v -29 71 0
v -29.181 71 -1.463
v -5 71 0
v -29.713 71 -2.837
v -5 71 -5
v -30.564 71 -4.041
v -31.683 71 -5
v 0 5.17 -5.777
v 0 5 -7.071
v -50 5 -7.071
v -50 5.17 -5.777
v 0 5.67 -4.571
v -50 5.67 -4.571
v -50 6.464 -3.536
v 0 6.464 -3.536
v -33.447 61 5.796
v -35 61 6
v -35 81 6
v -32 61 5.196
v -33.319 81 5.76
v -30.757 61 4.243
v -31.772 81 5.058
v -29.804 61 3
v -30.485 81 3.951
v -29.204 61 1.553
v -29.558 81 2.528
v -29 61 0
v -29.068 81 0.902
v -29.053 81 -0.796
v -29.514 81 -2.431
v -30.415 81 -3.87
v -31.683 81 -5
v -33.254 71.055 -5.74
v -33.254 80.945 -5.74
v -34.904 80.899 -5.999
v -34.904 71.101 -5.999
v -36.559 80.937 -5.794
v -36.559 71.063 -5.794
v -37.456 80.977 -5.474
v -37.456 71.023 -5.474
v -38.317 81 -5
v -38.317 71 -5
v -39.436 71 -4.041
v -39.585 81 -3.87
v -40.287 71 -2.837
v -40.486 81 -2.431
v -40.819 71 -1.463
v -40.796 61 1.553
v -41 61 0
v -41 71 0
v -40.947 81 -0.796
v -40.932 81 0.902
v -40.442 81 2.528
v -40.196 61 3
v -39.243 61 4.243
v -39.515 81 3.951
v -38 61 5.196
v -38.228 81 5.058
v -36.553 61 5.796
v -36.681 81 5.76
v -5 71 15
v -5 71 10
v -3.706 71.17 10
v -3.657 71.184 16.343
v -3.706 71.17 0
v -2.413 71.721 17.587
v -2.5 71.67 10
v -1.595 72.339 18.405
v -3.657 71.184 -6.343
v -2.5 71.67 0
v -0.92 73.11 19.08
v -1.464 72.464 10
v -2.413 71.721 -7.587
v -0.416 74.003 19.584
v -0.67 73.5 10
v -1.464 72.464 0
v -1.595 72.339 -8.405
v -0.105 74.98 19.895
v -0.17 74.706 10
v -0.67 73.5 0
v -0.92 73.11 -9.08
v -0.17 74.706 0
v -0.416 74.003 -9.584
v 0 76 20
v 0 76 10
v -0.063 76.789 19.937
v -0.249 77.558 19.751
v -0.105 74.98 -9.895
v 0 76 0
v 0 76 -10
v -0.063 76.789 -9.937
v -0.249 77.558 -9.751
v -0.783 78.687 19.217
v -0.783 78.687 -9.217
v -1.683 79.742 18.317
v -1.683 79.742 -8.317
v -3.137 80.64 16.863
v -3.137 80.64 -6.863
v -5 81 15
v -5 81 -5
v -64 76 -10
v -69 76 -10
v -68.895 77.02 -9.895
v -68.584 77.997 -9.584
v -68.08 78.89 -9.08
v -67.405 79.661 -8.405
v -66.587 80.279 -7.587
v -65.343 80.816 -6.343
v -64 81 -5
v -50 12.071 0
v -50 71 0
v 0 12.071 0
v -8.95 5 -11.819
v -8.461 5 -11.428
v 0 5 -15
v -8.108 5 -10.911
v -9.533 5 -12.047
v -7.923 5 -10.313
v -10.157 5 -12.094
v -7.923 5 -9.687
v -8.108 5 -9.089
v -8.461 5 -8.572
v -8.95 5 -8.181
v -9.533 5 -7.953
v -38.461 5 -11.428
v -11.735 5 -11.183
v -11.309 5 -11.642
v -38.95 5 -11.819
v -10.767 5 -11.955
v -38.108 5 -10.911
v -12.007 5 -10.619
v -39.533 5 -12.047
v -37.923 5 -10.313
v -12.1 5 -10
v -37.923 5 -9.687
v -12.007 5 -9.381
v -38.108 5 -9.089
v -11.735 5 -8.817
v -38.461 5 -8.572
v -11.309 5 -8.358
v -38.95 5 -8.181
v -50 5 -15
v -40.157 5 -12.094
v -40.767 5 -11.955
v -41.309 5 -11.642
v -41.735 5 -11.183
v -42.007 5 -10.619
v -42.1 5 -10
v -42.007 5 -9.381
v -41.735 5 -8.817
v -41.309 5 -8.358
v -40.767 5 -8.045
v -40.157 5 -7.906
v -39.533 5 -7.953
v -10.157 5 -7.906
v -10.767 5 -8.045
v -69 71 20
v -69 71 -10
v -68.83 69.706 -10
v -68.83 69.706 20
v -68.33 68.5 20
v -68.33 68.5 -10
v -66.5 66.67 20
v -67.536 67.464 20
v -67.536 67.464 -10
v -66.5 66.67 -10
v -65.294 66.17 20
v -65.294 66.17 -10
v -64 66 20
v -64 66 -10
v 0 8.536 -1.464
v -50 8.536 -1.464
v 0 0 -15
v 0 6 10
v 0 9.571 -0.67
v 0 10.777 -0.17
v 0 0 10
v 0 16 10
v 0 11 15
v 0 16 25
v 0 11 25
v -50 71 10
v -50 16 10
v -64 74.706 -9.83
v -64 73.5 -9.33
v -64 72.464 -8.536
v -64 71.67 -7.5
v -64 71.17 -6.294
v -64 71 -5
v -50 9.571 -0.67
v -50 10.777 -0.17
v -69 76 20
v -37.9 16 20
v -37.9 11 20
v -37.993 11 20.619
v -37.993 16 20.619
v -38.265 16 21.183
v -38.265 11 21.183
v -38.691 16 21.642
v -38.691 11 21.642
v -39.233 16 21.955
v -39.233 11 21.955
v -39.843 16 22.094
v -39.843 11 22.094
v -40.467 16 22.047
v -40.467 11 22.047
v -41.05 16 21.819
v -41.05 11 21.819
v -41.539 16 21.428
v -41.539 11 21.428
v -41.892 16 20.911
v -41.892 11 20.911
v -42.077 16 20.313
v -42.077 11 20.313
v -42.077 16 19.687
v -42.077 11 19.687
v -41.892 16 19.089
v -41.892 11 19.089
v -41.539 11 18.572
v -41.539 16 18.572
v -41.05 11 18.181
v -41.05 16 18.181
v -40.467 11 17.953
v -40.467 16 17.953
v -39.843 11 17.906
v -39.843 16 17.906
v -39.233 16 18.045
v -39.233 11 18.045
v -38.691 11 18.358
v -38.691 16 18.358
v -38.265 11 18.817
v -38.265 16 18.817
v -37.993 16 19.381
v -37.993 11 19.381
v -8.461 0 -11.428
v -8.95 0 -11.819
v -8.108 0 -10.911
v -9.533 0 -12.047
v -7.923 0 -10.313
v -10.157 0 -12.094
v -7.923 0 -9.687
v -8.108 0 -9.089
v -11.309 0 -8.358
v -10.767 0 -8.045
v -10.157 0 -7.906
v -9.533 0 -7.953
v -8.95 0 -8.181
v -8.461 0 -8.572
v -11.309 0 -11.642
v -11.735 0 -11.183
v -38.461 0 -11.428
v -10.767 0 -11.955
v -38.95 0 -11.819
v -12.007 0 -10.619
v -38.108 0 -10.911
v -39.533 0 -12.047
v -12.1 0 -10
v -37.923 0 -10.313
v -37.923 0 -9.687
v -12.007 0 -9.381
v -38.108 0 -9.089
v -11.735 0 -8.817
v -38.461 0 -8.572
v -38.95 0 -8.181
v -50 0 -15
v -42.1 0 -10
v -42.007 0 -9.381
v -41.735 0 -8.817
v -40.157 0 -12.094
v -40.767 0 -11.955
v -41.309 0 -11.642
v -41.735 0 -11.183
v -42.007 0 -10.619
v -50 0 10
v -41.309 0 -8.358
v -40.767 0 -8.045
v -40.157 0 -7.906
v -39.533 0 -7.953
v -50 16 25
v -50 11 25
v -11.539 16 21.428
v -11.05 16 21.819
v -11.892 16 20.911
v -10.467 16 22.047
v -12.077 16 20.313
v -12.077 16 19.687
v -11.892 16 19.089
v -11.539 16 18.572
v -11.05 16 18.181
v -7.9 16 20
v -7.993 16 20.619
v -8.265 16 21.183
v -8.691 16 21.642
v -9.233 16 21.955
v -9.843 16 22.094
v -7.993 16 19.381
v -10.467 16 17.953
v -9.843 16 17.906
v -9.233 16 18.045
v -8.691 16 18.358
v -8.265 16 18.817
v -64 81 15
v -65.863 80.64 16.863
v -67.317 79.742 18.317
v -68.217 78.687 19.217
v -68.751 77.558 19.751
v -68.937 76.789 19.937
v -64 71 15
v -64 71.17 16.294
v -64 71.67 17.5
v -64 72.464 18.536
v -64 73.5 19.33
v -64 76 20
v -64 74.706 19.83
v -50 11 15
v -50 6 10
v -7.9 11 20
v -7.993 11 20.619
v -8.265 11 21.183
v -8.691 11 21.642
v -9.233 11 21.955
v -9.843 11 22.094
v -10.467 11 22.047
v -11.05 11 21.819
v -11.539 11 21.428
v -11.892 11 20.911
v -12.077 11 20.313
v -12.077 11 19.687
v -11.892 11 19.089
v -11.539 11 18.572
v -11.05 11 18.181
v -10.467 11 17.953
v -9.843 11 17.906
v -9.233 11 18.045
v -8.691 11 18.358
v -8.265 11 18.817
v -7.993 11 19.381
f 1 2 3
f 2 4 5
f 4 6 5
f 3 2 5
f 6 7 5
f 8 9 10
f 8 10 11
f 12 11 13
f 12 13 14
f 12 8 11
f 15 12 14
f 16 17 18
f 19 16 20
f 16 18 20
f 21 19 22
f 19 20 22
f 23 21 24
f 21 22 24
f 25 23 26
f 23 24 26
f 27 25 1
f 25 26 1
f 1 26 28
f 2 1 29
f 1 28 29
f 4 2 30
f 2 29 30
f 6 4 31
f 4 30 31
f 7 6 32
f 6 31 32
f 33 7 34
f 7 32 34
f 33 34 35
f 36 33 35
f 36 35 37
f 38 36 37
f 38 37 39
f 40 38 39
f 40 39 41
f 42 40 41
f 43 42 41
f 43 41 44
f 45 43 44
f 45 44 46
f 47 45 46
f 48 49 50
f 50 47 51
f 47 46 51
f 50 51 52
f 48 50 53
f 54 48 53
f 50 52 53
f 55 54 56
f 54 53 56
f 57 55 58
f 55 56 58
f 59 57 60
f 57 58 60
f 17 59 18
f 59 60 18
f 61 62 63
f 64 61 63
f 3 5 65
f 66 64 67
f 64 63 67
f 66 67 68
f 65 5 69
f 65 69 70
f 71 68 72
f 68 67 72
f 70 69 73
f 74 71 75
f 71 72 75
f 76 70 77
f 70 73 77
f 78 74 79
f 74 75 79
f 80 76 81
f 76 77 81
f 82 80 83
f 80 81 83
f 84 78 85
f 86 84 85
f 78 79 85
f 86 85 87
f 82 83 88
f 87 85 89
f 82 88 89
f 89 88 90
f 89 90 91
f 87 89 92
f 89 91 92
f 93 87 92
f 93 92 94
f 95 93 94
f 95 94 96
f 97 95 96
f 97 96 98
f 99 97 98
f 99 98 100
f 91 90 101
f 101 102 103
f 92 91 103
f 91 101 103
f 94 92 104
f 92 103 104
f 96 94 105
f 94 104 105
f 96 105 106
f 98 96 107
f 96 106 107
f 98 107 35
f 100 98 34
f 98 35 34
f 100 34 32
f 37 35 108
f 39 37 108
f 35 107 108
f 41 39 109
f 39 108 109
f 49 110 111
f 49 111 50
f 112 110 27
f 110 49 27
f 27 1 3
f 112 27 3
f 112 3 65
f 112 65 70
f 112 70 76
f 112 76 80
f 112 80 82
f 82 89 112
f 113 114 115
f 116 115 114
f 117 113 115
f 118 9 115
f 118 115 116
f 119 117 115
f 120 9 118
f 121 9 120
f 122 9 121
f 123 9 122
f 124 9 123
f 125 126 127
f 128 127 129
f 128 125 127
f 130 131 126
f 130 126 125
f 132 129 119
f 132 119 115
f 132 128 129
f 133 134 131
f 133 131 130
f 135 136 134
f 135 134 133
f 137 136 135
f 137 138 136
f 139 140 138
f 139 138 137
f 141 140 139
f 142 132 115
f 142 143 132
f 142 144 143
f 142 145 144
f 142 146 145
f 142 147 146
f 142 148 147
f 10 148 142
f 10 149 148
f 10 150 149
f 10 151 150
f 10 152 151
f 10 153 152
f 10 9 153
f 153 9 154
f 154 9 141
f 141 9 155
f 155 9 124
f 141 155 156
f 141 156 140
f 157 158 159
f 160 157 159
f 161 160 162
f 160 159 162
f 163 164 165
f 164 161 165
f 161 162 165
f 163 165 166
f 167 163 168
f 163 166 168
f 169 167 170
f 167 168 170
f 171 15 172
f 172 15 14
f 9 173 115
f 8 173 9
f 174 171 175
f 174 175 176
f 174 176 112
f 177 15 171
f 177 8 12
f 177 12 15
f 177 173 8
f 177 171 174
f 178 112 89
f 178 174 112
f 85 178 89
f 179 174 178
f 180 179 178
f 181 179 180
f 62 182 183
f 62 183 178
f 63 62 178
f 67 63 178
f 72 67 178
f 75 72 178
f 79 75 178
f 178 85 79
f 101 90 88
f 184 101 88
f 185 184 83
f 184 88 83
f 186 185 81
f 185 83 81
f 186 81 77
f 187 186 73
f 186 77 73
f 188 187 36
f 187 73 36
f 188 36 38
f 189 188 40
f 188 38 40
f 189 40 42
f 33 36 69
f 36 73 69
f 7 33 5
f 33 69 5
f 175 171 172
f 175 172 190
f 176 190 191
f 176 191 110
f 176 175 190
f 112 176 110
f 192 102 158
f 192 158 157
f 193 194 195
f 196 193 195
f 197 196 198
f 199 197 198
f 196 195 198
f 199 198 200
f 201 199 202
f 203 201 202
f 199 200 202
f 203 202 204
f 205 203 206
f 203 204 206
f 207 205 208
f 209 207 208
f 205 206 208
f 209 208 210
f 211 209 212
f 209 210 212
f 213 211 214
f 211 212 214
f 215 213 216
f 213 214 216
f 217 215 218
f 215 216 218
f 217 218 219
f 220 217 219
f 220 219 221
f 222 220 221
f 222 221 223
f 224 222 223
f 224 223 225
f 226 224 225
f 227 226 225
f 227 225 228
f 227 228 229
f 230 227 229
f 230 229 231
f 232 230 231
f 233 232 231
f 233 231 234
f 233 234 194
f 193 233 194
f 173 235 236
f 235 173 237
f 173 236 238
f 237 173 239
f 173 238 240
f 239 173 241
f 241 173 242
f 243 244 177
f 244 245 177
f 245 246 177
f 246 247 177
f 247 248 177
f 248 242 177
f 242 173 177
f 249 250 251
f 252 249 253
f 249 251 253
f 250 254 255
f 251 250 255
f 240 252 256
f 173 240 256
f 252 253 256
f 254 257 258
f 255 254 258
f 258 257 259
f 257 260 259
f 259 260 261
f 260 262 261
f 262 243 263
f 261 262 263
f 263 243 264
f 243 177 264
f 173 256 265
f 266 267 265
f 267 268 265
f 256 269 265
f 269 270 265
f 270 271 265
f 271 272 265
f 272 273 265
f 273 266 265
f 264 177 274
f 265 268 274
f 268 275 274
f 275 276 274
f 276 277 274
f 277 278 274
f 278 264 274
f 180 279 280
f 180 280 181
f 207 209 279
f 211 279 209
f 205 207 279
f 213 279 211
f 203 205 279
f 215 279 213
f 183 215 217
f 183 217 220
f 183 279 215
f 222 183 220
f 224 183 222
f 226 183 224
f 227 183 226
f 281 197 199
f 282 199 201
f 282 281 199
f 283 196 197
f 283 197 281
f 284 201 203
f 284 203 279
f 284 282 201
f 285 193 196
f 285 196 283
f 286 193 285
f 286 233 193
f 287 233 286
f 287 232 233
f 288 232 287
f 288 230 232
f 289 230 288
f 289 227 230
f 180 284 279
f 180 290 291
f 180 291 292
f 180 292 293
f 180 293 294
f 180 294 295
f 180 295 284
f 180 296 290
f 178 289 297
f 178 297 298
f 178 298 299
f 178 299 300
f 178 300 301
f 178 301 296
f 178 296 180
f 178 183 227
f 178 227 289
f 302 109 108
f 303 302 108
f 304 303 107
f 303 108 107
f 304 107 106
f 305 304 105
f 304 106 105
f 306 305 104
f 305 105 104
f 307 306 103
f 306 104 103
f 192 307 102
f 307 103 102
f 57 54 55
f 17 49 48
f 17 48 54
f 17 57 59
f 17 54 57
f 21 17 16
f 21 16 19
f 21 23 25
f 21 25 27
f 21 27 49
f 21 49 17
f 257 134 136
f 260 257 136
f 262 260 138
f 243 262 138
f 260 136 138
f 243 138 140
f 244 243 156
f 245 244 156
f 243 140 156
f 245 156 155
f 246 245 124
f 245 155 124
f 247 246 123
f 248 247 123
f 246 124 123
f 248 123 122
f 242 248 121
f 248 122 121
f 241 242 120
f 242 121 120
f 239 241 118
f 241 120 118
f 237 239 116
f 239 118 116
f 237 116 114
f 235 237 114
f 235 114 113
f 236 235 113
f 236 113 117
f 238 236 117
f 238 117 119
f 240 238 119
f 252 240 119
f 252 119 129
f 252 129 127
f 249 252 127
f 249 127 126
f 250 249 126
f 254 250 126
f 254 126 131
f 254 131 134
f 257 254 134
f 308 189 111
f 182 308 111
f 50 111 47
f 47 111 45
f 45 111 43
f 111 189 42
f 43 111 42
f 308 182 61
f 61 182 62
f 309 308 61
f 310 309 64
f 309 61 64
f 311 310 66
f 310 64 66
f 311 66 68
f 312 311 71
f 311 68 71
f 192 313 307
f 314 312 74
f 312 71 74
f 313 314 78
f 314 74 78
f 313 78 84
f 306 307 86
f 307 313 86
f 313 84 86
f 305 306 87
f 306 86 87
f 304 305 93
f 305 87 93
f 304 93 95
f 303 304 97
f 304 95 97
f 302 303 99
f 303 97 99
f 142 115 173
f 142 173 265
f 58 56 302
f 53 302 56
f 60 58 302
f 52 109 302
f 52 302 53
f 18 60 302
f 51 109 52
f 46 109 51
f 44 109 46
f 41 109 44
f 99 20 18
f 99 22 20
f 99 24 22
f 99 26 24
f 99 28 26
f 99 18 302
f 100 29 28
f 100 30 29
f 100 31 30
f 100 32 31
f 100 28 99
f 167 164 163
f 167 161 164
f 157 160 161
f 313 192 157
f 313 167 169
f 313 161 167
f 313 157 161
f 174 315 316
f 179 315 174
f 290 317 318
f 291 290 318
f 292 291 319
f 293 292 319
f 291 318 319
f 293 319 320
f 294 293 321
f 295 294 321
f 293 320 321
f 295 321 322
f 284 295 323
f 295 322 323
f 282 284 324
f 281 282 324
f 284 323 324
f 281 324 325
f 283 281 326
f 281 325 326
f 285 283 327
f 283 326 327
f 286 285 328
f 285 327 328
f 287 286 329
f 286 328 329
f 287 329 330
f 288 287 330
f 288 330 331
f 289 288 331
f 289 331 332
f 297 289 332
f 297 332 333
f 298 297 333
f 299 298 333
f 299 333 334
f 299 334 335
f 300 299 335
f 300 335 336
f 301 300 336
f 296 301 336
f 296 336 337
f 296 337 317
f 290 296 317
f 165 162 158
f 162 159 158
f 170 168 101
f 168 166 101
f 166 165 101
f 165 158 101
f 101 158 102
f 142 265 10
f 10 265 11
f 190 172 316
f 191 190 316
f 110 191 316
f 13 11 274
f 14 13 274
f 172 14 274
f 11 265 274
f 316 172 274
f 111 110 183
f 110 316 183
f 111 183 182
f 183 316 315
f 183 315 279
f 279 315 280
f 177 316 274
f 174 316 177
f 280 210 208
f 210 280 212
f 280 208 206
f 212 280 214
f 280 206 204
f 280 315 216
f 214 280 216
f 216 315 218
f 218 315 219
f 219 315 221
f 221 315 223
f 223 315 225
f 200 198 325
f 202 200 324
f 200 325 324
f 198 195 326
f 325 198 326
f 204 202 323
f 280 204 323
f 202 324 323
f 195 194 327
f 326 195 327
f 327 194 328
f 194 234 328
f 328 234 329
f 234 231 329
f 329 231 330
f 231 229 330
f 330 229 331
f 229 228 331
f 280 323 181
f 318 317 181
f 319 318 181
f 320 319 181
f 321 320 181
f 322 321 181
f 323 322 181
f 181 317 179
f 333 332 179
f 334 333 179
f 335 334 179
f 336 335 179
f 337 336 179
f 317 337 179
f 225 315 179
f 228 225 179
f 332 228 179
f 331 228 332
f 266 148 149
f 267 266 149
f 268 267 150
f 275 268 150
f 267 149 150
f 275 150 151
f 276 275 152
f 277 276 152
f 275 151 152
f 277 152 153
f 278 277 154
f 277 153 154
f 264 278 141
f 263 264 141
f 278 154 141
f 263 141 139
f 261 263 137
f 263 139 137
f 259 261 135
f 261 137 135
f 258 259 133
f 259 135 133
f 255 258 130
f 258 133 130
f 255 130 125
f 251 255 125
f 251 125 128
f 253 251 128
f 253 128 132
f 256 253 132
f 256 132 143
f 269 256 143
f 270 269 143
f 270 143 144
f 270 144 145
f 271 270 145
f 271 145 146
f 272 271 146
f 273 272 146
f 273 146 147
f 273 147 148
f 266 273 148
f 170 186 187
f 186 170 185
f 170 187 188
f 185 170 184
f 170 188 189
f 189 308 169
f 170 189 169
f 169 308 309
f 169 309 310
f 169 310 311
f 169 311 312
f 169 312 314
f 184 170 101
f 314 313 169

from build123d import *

# Parameters (mm, degrees)
BOSS_EXTRU_1_DEPTH      = 10
BOSS_EXTRU_2_DEPTH      = 10
BOSS_EXTRU_2_DEPTH_BACK = 20
ESQUISSE2_W             = 69
ESQUISSE2_H             = 10
ESQUISSE3_W             = 50
ESQUISSE3_H             = 5
BOSS_EXTRU_3_DEPTH      = 15
CHANFREIN1_SIZE         = 5
ESQUISSE4_R             = 2.1
ENL_V_MAT_EXTRU_1_DEPTH = 15
ESQUISSE5_W             = 30
ESQUISSE5_H             = 5
BOSS_EXTRU_4_DEPTH      = 5
ESQUISSE6_W             = 50
ESQUISSE6_H             = 5
BOSS_EXTRU_5_DEPTH      = 15
CHANFREIN2_SIZE         = 5
ESQUISSE7_R             = 2.1
ENL_V_MAT_EXTRU_2_DEPTH = 15
ESQUISSE8_R             = 6
ENL_V_MAT_EXTRU_3_DEPTH = 20
CONG_1_R                = 5


with BuildPart() as part:
    # Esquisse1 → Boss.-Extru.1 (new body)
    with BuildSketch(Plane.XY):
        Polygon((0, 0), (0, 81), (-69, 81), (-69, 66), (-64, 66), (-64, 71), (-50, 71), (-50, 0), align=None)
    extrude(amount=BOSS_EXTRU_1_DEPTH)

    # Esquisse2 → Boss.-Extru.2 (add, two sides: drawn at the far end of the back side and taken through both)
    with BuildSketch(Plane.XY.offset(10).offset(-BOSS_EXTRU_2_DEPTH_BACK)):
        with Locations((-34.5, 76)):
            Rectangle(ESQUISSE2_W, ESQUISSE2_H)
    extrude(amount=BOSS_EXTRU_2_DEPTH + BOSS_EXTRU_2_DEPTH_BACK)

    # Esquisse3 → Boss.-Extru.3 (add)
    with BuildSketch(Plane(origin=(0, 0, 0), x_dir=(-1, 0, 0), z_dir=(0, 0, -1))):
        with Locations((25, 2.5)):
            Rectangle(ESQUISSE3_W, ESQUISSE3_H)
    extrude(amount=BOSS_EXTRU_3_DEPTH)

    # Chanfrein1
    chanfrein1_edges = [part.edges().sort_by_distance(p)[0] for p in [
        (-25, 5, 0),
    ]]
    chamfer(chanfrein1_edges, length=CHANFREIN1_SIZE)

    # Esquisse4 → Enlèv. mat.-Extru.1 (cut)
    with BuildSketch(Plane(origin=(0, 5, 0), x_dir=(1, 0, 0), z_dir=(0, 1, 0))):
        with Locations(Location((-40, 10, 0), (0, 0, 180))):
            Circle(ESQUISSE4_R)
        with Locations(Location((-10, 10, 0), (0, 0, 180))):
            Circle(ESQUISSE4_R)
    extrude(amount=-ENL_V_MAT_EXTRU_1_DEPTH, mode=Mode.SUBTRACT)

    # Esquisse5 → Boss.-Extru.4 (add)
    with BuildSketch(Plane.ZY.offset(69)):
        with Locations((5, 68.5)):
            Rectangle(ESQUISSE5_W, ESQUISSE5_H)
    extrude(amount=-BOSS_EXTRU_4_DEPTH)

    # Esquisse6 → Boss.-Extru.5 (add)
    with BuildSketch(Plane.XY.offset(10)):
        with Locations((-25, 13.5)):
            Rectangle(ESQUISSE6_W, ESQUISSE6_H)
    extrude(amount=BOSS_EXTRU_5_DEPTH)

    # Chanfrein2
    chanfrein2_edges = [part.edges().sort_by_distance(p)[0] for p in [
        (-25, 11, 10),
    ]]
    chamfer(chanfrein2_edges, length=CHANFREIN2_SIZE)

    # Esquisse7 → Enlèv. mat.-Extru.2 (cut)
    with BuildSketch(Plane.XZ.offset(-11)):
        with Locations((-10, 20)):
            Circle(ESQUISSE7_R)
        with Locations((-40, 20)):
            Circle(ESQUISSE7_R)
    extrude(amount=-ENL_V_MAT_EXTRU_2_DEPTH, mode=Mode.SUBTRACT)

    # Esquisse8 → Enlèv. mat.-Extru.3 (cut)
    with BuildSketch(Plane(origin=(0, 81, 0), x_dir=(1, 0, 0), z_dir=(0, 1, 0))):
        with Locations(Location((-35, 0, 0), (0, 0, 270))):
            Circle(ESQUISSE8_R)
    extrude(amount=-ENL_V_MAT_EXTRU_3_DEPTH, mode=Mode.SUBTRACT)

    # Congé1
    # the kernel refuses this fillet: 5 mm, written as the material it adds along each edge
    with BuildSketch(Plane(origin=(0, 10, 0), x_dir=(0, -0.7071067811865476, -0.7071067811865476), z_dir=(-1, 0, 0)), Plane(origin=(0, 5, -5), x_dir=(0, 0, -1), z_dir=(-1, 0, 0))) as cong_1_piece_1:
        with BuildLine():
            CenterArc((CONG_1_R * 0.414213562373, -CONG_1_R), CONG_1_R, 90, 45)
            Line((-CONG_1_R * 0.292893218813, -CONG_1_R * 0.292893218813), (0, 0))
            Line((0, 0), (CONG_1_R * 0.414213562373, 0))
        make_face()
    extrude(amount=50)
    # the kernel refuses this fillet: 5 mm, written as the material it takes off along each edge
    with BuildSketch(Plane(origin=(-81.5, 81, 20), x_dir=(0, -1, 0), z_dir=(1, 0, 0))) as cong_1_2_piece_1:
        with BuildLine():
            CenterArc((CONG_1_R, CONG_1_R), CONG_1_R, 180, 90)
            Line((0, CONG_1_R), (0, 0))
            Line((0, 0), (CONG_1_R, 0))
        make_face()
    extrude(amount=94, mode=Mode.SUBTRACT)
    with BuildSketch(Plane(origin=(12.5, 71, 20), x_dir=(0, 0, -1), z_dir=(-1, 0, 0))) as cong_1_2_piece_2:
        with BuildLine():
            CenterArc((CONG_1_R, -CONG_1_R), CONG_1_R, 90, 90)
            Line((0, -CONG_1_R), (0, 0))
            Line((0, 0), (CONG_1_R, 0))
        make_face()
    extrude(amount=76.5, mode=Mode.SUBTRACT)
    with BuildSketch(Plane(origin=(0, 71, -2.5), x_dir=(0, 1, 0), z_dir=(0, 0, 1))) as cong_1_2_piece_3_section:
        with BuildLine():
            CenterArc((CONG_1_R, CONG_1_R), CONG_1_R, 180, 90)
            Line((0, CONG_1_R), (0, 0))
            Line((0, 0), (CONG_1_R, 0))
        make_face()
    cong_1_2_piece_3 = extrude(amount=35, mode=Mode.PRIVATE)
    cong_1_2_piece_3 = split(cong_1_2_piece_3, bisect_by=Plane(origin=(-1.116839695, 72.116839695, 0), z_dir=(0, 0, -1)), keep=Keep.TOP, mode=Mode.PRIVATE)
    add(cong_1_2_piece_3, mode=Mode.SUBTRACT)
    with BuildSketch(Plane(origin=(0, 71, 10), x_dir=(0, 1, 0), z_dir=(0, 0, 1)), Plane(origin=(0, 71, -22.5), x_dir=(0, 1, 0), z_dir=(0, 0, 1))) as cong_1_2_piece_4:
        with BuildLine():
            CenterArc((CONG_1_R, CONG_1_R), CONG_1_R, 180, 90)
            Line((0, CONG_1_R), (0, 0))
            Line((0, 0), (CONG_1_R, 0))
        make_face()
    extrude(amount=22.5, mode=Mode.SUBTRACT)
    with BuildSketch(Plane(origin=(0, 71, -22.5), x_dir=(0, 1, 0), z_dir=(0, 0, 1))) as cong_1_2_piece_5_section:
        with BuildLine():
            CenterArc((CONG_1_R, CONG_1_R), CONG_1_R, 180, 90)
            Line((0, CONG_1_R), (0, 0))
            Line((0, 0), (CONG_1_R, 0))
        make_face()
    cong_1_2_piece_5 = extrude(amount=35, mode=Mode.PRIVATE)
    cong_1_2_piece_5 = split(cong_1_2_piece_5, bisect_by=Plane(origin=(-1.116839695, 72.116839695, 10), z_dir=(0, 0, 1)), keep=Keep.TOP, mode=Mode.PRIVATE)
    add(cong_1_2_piece_5, mode=Mode.SUBTRACT)
    with BuildSketch(Plane(origin=(0, 81, -22.5), x_dir=(0, -1, 0), z_dir=(0, 0, 1)), Plane(origin=(-69, 81, -22.5), x_dir=(1, 0, 0), z_dir=(0, 0, 1))) as cong_1_2_piece_6:
        with BuildLine():
            CenterArc((CONG_1_R, -CONG_1_R), CONG_1_R, 90, 90)
            Line((0, -CONG_1_R), (0, 0))
            Line((0, 0), (CONG_1_R, 0))
        make_face()
    extrude(amount=55, mode=Mode.SUBTRACT)
    with BuildSketch(Plane(origin=(12.5, 71, -10), x_dir=(0, 0, 1), z_dir=(-1, 0, 0))) as cong_1_2_piece_7:
        with BuildLine():
            CenterArc((CONG_1_R, CONG_1_R), CONG_1_R, 180, 90)
            Line((0, CONG_1_R), (0, 0))
            Line((0, 0), (CONG_1_R, 0))
        make_face()
    extrude(amount=76.5, mode=Mode.SUBTRACT)
    with BuildSketch(Plane(origin=(-81.5, 81, -10), x_dir=(0, -1, 0), z_dir=(1, 0, 0))) as cong_1_2_piece_8:
        with BuildLine():
            CenterArc((CONG_1_R, -CONG_1_R), CONG_1_R, 90, 90)
            Line((0, -CONG_1_R), (0, 0))
            Line((0, 0), (CONG_1_R, 0))
        make_face()
    extrude(amount=94, mode=Mode.SUBTRACT)
    with BuildSketch(Plane(origin=(-69, 66, -22.5), x_dir=(1, 0, 0), z_dir=(0, 0, 1))) as cong_1_2_piece_9:
        with BuildLine():
            CenterArc((CONG_1_R, CONG_1_R), CONG_1_R, 180, 90)
            Line((0, CONG_1_R), (0, 0))
            Line((0, 0), (CONG_1_R, 0))
        make_face()
    extrude(amount=55, mode=Mode.SUBTRACT)


solid = part.part
